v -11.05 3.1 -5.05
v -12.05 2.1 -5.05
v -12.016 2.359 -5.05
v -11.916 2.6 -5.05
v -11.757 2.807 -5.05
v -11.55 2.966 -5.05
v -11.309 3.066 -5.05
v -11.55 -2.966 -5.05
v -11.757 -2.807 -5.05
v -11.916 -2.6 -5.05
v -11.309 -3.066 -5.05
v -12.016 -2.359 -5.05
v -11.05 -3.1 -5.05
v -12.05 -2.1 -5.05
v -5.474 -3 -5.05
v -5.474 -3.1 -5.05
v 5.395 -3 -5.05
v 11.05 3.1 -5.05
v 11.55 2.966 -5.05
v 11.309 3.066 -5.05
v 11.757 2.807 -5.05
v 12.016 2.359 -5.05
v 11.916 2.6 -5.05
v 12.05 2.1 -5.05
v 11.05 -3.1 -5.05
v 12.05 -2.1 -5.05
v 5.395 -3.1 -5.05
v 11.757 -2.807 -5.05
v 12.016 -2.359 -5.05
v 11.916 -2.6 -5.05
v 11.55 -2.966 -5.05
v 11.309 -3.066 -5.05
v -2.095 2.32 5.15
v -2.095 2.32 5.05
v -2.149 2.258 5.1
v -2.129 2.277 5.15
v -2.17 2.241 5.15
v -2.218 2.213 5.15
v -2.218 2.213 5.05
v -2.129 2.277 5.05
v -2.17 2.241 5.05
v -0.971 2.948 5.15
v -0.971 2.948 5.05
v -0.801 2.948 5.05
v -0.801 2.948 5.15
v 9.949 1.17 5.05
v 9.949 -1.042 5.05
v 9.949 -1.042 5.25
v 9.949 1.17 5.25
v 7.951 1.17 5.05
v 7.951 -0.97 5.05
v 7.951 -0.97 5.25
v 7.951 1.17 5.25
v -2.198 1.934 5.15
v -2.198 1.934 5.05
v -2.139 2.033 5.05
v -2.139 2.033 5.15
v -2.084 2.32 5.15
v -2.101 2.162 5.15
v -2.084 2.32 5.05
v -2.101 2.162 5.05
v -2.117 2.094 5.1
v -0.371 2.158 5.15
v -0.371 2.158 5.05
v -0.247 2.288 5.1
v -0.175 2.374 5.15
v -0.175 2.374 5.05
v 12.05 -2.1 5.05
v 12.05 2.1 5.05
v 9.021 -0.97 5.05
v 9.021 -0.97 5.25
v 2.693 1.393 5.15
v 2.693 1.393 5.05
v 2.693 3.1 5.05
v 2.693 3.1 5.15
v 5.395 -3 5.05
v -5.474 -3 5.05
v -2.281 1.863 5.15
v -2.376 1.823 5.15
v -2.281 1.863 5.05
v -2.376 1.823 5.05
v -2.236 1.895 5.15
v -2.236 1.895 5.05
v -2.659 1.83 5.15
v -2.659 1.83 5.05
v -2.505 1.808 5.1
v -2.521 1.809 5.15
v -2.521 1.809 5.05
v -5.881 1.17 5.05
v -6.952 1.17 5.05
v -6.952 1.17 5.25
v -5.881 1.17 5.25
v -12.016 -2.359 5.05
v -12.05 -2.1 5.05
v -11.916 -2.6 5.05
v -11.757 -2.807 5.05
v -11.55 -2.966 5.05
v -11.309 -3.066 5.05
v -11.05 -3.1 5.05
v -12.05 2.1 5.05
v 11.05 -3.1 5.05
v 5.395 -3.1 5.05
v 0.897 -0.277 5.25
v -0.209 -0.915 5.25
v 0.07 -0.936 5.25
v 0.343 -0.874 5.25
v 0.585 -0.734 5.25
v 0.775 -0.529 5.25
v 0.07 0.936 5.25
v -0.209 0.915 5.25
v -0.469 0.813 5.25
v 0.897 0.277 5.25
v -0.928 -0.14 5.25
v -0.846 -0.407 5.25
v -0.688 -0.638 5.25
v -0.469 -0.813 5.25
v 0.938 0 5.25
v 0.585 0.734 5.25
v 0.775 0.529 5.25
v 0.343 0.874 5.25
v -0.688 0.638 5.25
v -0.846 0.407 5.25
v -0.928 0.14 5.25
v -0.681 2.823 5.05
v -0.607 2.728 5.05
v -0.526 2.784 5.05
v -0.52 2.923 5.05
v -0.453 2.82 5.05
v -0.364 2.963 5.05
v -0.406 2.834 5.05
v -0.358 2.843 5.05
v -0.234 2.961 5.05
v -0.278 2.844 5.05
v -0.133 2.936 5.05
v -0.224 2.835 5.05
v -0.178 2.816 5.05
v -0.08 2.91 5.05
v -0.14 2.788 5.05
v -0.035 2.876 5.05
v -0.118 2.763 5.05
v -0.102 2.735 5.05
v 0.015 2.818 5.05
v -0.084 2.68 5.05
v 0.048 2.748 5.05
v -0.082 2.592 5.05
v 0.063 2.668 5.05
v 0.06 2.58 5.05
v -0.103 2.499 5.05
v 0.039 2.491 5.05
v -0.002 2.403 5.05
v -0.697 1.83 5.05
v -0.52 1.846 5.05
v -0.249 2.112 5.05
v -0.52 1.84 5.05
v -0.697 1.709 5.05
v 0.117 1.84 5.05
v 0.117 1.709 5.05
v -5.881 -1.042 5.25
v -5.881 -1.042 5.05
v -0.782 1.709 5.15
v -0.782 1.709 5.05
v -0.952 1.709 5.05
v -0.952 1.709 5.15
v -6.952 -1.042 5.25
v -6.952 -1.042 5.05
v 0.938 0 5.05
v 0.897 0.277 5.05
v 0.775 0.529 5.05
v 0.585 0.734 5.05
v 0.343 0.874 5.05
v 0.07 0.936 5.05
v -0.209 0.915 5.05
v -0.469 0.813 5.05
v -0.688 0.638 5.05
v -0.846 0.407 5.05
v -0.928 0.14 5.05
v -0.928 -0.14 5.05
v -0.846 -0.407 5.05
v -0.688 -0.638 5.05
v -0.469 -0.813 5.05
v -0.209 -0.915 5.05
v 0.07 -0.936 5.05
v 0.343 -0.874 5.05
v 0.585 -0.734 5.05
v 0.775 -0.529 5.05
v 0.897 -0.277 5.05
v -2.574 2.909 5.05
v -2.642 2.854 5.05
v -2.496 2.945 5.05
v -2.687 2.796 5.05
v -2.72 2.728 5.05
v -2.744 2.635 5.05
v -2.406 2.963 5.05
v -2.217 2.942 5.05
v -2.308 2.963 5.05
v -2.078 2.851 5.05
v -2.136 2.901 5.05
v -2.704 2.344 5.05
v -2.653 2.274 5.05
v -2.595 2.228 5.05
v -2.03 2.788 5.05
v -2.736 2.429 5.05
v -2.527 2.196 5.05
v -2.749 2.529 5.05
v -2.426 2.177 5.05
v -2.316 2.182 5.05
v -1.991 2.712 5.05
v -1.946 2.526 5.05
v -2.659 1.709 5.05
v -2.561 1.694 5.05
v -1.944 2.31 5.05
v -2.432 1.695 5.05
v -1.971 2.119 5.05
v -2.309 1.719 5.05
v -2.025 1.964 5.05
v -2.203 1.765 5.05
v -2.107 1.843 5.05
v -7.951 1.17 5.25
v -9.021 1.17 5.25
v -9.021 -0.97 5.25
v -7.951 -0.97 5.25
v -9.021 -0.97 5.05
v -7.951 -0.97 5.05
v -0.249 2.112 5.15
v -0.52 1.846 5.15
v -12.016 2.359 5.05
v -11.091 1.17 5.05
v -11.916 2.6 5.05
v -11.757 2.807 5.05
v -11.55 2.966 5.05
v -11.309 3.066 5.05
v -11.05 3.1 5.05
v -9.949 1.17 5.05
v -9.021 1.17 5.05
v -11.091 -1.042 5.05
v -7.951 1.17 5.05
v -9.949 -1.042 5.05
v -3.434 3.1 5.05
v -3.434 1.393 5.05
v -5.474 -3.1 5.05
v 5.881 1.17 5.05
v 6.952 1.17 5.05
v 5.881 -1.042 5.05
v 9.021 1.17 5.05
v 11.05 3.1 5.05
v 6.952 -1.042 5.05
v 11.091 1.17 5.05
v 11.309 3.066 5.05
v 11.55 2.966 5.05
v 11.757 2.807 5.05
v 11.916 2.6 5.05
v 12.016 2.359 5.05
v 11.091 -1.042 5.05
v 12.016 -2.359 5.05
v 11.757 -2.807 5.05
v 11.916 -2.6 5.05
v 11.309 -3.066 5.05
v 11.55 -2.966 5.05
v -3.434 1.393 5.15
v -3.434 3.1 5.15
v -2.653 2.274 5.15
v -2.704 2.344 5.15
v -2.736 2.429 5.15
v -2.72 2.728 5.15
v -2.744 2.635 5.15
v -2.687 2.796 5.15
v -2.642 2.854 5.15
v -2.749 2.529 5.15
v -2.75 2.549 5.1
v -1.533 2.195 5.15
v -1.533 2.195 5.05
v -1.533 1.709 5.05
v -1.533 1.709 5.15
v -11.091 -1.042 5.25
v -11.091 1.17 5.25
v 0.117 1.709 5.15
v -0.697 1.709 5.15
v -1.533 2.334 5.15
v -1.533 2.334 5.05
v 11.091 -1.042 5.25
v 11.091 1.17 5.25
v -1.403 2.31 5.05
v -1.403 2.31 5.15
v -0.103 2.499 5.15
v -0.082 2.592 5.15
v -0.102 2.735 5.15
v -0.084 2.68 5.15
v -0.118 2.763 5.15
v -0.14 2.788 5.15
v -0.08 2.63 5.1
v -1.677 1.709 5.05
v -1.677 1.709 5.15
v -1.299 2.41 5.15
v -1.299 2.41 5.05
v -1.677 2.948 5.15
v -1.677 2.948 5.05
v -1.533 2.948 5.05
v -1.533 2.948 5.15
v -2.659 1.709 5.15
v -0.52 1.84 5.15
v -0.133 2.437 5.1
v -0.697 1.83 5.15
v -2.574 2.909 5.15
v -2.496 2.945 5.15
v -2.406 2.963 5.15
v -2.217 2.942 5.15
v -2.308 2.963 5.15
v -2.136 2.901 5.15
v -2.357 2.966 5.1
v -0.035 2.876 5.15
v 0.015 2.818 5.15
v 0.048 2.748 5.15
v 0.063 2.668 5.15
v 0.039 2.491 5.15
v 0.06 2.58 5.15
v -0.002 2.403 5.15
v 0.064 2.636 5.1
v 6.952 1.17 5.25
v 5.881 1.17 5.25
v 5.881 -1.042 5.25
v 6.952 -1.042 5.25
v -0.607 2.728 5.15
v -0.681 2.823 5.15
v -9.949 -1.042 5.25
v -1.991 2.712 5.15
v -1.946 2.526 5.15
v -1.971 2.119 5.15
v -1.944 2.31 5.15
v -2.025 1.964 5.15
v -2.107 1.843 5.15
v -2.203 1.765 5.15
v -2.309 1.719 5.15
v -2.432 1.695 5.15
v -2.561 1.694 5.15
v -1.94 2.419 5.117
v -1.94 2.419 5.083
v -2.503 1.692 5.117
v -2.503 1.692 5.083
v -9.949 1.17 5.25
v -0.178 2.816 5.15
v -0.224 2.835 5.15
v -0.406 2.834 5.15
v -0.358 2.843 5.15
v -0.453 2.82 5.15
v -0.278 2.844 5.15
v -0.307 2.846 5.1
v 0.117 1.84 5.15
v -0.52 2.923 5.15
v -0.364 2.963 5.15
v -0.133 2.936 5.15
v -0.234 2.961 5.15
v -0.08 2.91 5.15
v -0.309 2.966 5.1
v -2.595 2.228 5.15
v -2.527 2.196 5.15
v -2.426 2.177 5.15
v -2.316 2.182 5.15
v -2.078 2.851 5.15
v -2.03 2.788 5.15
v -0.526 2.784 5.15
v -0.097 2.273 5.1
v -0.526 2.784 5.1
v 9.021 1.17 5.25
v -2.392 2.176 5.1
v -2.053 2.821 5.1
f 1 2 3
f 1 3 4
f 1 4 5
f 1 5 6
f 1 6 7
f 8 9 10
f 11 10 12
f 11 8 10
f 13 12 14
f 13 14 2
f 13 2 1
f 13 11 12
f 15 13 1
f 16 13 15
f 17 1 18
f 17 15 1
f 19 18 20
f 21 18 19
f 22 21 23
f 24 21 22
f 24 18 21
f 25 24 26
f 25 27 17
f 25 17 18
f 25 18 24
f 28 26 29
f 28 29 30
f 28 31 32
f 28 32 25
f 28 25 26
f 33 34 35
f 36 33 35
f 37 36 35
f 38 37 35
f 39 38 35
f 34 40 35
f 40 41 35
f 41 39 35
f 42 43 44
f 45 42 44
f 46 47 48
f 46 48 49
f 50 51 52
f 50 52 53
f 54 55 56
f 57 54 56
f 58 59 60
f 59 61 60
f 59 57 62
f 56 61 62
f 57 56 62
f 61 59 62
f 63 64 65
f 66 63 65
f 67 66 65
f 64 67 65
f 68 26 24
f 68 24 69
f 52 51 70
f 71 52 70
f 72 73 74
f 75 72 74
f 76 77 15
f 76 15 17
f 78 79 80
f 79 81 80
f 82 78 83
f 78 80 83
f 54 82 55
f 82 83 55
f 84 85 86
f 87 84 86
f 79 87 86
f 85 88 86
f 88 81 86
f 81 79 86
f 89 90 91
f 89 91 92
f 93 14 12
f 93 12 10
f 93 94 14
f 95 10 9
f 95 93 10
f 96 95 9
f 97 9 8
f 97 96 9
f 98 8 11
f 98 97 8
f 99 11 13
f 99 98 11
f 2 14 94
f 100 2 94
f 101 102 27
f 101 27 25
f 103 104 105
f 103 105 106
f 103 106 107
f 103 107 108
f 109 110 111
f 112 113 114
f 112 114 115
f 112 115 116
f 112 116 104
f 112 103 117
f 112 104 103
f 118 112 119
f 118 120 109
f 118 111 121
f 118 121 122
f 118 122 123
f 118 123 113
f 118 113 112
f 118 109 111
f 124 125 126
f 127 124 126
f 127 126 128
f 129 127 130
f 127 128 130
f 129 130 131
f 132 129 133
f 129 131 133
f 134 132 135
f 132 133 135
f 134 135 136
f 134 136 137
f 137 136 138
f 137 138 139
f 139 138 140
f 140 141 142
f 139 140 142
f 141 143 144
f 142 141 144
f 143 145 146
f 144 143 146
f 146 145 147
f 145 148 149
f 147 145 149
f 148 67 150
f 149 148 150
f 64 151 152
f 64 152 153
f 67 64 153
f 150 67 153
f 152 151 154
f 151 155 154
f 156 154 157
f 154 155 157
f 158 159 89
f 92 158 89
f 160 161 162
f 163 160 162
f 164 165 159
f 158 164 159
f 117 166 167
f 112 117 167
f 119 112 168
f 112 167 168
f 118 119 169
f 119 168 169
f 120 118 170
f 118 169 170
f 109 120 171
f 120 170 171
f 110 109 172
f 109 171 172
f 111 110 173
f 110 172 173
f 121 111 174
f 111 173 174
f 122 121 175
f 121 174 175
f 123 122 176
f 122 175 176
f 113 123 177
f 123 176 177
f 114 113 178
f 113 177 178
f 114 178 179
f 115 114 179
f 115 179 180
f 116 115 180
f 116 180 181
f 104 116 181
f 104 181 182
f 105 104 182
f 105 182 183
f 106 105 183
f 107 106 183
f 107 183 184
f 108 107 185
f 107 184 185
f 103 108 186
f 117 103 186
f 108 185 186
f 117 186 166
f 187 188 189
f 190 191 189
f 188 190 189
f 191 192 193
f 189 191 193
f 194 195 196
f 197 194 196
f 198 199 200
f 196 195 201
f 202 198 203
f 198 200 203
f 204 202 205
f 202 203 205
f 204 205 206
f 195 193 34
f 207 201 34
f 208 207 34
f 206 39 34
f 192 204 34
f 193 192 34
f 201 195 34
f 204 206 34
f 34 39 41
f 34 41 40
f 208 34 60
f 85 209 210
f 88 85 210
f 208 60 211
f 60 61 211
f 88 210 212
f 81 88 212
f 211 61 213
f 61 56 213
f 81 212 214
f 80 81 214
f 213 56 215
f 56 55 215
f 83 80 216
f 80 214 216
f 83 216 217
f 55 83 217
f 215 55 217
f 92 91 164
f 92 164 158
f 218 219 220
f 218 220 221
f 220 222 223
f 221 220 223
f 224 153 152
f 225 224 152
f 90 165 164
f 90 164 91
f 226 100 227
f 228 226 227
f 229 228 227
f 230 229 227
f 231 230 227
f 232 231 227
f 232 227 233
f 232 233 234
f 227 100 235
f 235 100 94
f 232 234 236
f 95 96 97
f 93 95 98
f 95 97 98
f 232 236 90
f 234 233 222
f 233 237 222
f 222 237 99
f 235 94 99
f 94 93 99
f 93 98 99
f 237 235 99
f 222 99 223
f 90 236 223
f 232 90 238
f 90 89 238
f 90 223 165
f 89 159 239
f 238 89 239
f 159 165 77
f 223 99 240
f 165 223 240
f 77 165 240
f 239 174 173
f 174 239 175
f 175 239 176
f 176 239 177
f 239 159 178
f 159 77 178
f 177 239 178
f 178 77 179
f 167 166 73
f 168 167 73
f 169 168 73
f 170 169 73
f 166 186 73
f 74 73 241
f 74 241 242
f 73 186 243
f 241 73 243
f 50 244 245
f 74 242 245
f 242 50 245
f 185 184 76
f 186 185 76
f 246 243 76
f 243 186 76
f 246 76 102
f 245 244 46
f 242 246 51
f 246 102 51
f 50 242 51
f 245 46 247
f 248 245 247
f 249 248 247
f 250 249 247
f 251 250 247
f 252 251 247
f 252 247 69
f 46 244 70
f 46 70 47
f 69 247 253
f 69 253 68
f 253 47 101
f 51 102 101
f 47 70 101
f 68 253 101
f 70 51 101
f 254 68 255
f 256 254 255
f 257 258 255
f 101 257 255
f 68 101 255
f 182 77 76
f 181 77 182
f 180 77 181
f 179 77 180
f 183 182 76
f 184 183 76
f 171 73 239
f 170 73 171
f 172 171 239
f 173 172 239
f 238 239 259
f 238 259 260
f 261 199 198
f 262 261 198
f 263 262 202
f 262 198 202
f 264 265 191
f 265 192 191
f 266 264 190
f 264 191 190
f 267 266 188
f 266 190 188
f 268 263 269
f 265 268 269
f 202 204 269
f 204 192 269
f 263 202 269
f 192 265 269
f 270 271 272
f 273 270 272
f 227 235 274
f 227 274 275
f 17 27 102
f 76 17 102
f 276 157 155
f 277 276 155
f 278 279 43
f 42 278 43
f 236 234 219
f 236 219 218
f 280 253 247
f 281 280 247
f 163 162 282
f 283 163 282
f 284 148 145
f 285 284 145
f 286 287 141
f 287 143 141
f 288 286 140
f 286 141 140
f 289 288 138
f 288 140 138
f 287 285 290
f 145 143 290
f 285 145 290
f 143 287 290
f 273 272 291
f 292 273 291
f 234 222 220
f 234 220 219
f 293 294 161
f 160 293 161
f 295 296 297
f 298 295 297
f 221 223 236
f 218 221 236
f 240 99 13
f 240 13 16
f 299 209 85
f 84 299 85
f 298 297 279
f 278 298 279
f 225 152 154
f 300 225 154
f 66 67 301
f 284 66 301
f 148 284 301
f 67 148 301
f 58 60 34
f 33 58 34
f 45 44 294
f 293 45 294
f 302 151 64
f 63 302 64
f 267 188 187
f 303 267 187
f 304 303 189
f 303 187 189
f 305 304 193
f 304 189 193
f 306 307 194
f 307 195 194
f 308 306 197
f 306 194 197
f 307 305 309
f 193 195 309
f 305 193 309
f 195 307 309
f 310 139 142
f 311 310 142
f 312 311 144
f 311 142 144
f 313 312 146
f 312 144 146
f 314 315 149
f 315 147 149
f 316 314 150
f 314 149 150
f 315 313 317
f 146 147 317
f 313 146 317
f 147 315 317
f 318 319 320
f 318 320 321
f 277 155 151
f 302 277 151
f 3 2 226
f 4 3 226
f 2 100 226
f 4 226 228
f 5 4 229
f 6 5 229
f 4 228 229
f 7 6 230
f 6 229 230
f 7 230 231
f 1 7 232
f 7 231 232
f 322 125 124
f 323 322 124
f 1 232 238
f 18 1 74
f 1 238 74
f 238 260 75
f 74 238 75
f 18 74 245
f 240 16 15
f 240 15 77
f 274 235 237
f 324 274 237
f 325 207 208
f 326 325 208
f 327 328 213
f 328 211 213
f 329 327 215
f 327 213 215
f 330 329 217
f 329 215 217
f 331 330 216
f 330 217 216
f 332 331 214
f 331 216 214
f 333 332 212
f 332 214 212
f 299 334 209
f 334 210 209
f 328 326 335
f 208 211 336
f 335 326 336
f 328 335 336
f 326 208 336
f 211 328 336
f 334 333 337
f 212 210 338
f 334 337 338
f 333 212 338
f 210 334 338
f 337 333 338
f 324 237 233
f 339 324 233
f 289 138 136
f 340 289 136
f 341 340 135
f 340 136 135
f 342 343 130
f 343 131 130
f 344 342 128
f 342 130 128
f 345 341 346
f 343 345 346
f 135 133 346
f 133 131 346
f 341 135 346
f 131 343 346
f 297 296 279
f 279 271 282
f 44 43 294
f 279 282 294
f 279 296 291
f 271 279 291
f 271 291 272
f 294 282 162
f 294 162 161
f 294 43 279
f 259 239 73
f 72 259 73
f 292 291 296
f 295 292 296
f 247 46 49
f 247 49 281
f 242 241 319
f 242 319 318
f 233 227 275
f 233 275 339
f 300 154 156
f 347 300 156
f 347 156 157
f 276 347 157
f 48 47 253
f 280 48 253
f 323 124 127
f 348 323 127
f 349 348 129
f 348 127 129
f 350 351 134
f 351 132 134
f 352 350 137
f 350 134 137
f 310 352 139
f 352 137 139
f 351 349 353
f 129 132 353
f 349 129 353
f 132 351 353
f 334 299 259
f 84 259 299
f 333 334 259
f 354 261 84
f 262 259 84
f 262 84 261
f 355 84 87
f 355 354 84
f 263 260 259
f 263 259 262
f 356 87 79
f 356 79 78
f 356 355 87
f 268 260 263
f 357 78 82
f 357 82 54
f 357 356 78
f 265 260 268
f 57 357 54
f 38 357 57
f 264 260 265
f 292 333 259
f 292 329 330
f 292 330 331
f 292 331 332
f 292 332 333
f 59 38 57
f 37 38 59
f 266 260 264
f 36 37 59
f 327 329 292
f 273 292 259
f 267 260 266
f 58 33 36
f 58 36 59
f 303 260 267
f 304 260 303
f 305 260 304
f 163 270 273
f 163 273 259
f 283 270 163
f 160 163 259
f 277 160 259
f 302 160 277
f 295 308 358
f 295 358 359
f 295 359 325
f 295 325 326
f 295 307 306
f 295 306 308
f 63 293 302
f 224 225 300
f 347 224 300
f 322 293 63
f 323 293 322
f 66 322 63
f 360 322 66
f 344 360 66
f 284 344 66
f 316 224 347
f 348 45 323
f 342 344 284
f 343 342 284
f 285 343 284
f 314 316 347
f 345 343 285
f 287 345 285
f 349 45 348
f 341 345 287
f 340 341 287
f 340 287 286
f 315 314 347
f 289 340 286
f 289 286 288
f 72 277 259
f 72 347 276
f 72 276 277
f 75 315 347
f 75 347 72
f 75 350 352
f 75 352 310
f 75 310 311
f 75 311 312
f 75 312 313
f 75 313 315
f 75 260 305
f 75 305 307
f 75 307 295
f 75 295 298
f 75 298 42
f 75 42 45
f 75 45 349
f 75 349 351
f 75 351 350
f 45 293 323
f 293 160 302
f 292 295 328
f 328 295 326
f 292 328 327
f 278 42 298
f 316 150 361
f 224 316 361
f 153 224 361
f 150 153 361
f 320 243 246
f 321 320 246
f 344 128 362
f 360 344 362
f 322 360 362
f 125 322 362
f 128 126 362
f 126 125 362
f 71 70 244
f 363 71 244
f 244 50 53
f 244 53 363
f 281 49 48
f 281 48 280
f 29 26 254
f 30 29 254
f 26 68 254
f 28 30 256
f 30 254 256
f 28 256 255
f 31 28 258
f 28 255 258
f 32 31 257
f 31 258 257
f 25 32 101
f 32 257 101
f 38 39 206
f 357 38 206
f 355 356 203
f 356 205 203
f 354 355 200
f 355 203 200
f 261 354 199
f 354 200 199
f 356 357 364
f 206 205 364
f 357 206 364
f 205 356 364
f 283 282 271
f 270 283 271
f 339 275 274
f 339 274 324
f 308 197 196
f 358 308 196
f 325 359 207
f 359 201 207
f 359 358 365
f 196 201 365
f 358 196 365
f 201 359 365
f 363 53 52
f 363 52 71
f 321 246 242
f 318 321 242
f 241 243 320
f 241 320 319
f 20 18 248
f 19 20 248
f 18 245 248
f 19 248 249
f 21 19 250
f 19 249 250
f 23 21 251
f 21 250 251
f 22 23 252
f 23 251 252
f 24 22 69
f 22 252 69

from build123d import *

# Parameters (mm, degrees)
F0_W      = 24.1
F0_H      = 10.1
F1_DEPTH  = 3.1
F2_W      = 1.1417344213
F2_H      = 2.2121103248
F2_W_2    = 1.0703755543
F2_H_2    = 2.1407519816
F2_W_3    = 1.0703760199
F2_R      = 0.9384971682
F3_DEPTH  = 0.2
F4_R      = 1
F5_R      = 1
F6_R      = 1
F7_R      = 1
F8_W      = 10.8690736815
F8_H      = 10.1
F9_DEPTH  = 0.1
F10_W     = 6.1270436272
F10_H     = 1.7071549356
F11_DEPTH = 0.1


with BuildPart() as f1:
    # F0 (on Front) → F1 (new body, symmetric)
    with BuildSketch(Plane.XZ):
        Rectangle(F0_W, F0_H)
    extrude(amount=F1_DEPTH, both=True)

    # F2 (on face) → F3 (join)
    with BuildSketch(Plane.XY.offset(5.05)):
        with Locations((-10.5197010562, 0.0642262748)):
            Rectangle(F2_W, F2_H)
        with Locations((-8.4859863855, 0.0999054464)):
            Rectangle(F2_W_2, F2_H_2)
        with Locations((-6.4165925141, 0.0642262748)):
            Rectangle(F2_W_3, F2_H)
        with Locations((6.4165925141, 0.0642262748)):
            Rectangle(F2_W_3, F2_H)
        with Locations((8.4859863855, 0.0999054464)):
            Rectangle(F2_W_2, F2_H_2)
        with Locations((10.5197010562, 0.0642262748)):
            Rectangle(F2_W, F2_H)
        Circle(F2_R)
    extrude(amount=F3_DEPTH)

    # F4
    f4_edges = [f1.edges().sort_by_distance(p)[0] for p in [
        (-12.05, 3.1, 0),
    ]]
    fillet(f4_edges, radius=F4_R)

    # F5
    f5_edges = [f1.edges().sort_by_distance(p)[0] for p in [
        (-12.05, -3.1, 0),
    ]]
    fillet(f5_edges, radius=F5_R)

    # F6
    f6_edges = [f1.edges().sort_by_distance(p)[0] for p in [
        (12.05, 3.1, 0),
    ]]
    fillet(f6_edges, radius=F6_R)

    # F7
    f7_edges = [f1.edges().sort_by_distance(p)[0] for p in [
        (12.05, -3.1, 0),
    ]]
    fillet(f7_edges, radius=F7_R)

    # F8 (on face) → F9 (cut)
    with BuildSketch(Plane.XZ.offset(3.1)):
        with Locations((-0.0399495475, 0)):
            Rectangle(F8_W, F8_H)
    extrude(amount=-F9_DEPTH, mode=Mode.SUBTRACT)

    # F10 (on face) → F11 (join)
    with BuildSketch(Plane.XY.offset(5.05)):
        with Locations((-0.3709765151, 2.2464225322)):
            Rectangle(F10_W, F10_H)
        with BuildLine():
            add(Edge.make_bspline(
                [(-1.9910920446, 2.7120085217), (-1.9402540003, 2.5879636937), (-1.9402540003, 2.4193169547)],
                knots=[0, 0, 0, 1, 1, 1], degree=2))
            add(Edge.make_bspline(
                [(-1.9402540003, 2.4193169547), (-1.9402540003, 1.6921295692), (-2.5028616905, 1.6921295692)],
                knots=[0, 0, 0, 1, 1, 1], degree=2))
            add(Edge.make_bspline(
                [(-2.5028616905, 1.6921295692), (-2.6012841443, 1.6921295692), (-2.6587650264, 1.709211152)],
                knots=[0, 0, 0, 1, 1, 1], degree=2))
            Line((-2.6587650264, 1.709211152), (-2.6587650264, 1.8304090496))
            add(Edge.make_bspline(
                [(-2.6587650264, 1.8304090496), (-2.5909809673, 1.8084470145), (-2.5047596442, 1.8084470145)],
                knots=[0, 0, 0, 1, 1, 1], degree=2))
            add(Edge.make_bspline(
                [(-2.5047596442, 1.8084470145), (-2.301407467, 1.8084470145), (-2.1975622885, 1.9342542281)],
                knots=[0, 0, 0, 1, 1, 1], degree=2))
            add(Edge.make_bspline(
                [(-2.1975622885, 1.9342542281), (-2.0937171101, 2.0600614417), (-2.084498478, 2.3200810923)],
                knots=[0, 0, 0, 1, 1, 1], degree=2))
            Line((-2.084498478, 2.3200810923), (-2.0945305188, 2.3200810923))
            add(Edge.make_bspline(
                [(-2.0945305188, 2.3200810923), (-2.1411659514, 2.2498568071), (-2.2183042106, 2.212982279)],
                knots=[0, 0, 0, 1, 1, 1], degree=2))
            add(Edge.make_bspline(
                [(-2.2183042106, 2.212982279), (-2.2954424698, 2.1761077508), (-2.3919669699, 2.1761077508)],
                knots=[0, 0, 0, 1, 1, 1], degree=2))
            add(Edge.make_bspline(
                [(-2.3919669699, 2.1761077508), (-2.5562755291, 2.1761077508), (-2.6529355973, 2.2743946365)],
                knots=[0, 0, 0, 1, 1, 1], degree=2))
            add(Edge.make_bspline(
                [(-2.6529355973, 2.2743946365), (-2.7495956655, 2.3726815221), (-2.7495956655, 2.5489200756)],
                knots=[0, 0, 0, 1, 1, 1], degree=2))
            add(Edge.make_bspline(
                [(-2.7495956655, 2.5489200756), (-2.7495956655, 2.7419690758), (-2.6415478754, 2.8538127733)],
                knots=[0, 0, 0, 1, 1, 1], degree=2))
            add(Edge.make_bspline(
                [(-2.6415478754, 2.8538127733), (-2.5335000852, 2.9656564707), (-2.3572615317, 2.9656564707)],
                knots=[0, 0, 0, 1, 1, 1], degree=2))
            add(Edge.make_bspline(
                [(-2.3572615317, 2.9656564707), (-2.2309120456, 2.9656564707), (-2.1364210673, 2.9008549103)],
                knots=[0, 0, 0, 1, 1, 1], degree=2))
            add(Edge.make_bspline(
                [(-2.1364210673, 2.9008549103), (-2.0419300889, 2.8360533498), (-1.9910920446, 2.7120085217)],
                knots=[0, 0, 0, 1, 1, 1], degree=2))
        make_face(mode=Mode.SUBTRACT)
        Polygon((-1.2990168017, 2.4098271865), (-0.7822311354, 1.709211152), (-0.9516912831, 1.709211152), (-1.4031331164, 2.3100490515), (-1.5330073735, 2.1948161511), (-1.5330073735, 1.709211152), (-1.676980715, 1.709211152), (-1.676980715, 2.9480326154), (-1.5330073735, 2.9480326154), (-1.5330073735, 2.3336379041), (-0.9712130921, 2.9480326154), (-0.8009395357, 2.9480326154), align=None, mode=Mode.SUBTRACT)
        with BuildLine():
            Line((0.1168566239, 1.8396276817), (0.1168566239, 1.709211152))
            Line((0.1168566239, 1.709211152), (-0.6973654935, 1.709211152))
            Line((-0.6973654935, 1.709211152), (-0.6973654935, 1.8304090496))
            Line((-0.6973654935, 1.8304090496), (-0.3711886013, 2.1582127592))
            add(Edge.make_bspline(
                [(-0.3711886013, 2.1582127592), (-0.2220636714, 2.3092356428), (-0.17461483, 2.3736304989)],
                knots=[0, 0, 0, 1, 1, 1], degree=2))
            add(Edge.make_bspline(
                [(-0.17461483, 2.3736304989), (-0.1271659887, 2.438025355), (-0.103441568, 2.4990310082)],
                knots=[0, 0, 0, 1, 1, 1], degree=2))
            add(Edge.make_bspline(
                [(-0.103441568, 2.4990310082), (-0.0797171473, 2.5600366613), (-0.0797171473, 2.6302609465)],
                knots=[0, 0, 0, 1, 1, 1], degree=2))
            add(Edge.make_bspline(
                [(-0.0797171473, 2.6302609465), (-0.0797171473, 2.729496809), (-0.1399093918, 2.7875199635)],
                knots=[0, 0, 0, 1, 1, 1], degree=2))
            add(Edge.make_bspline(
                [(-0.1399093918, 2.7875199635), (-0.2001016362, 2.8455431181), (-0.3069293133, 2.8455431181)],
                knots=[0, 0, 0, 1, 1, 1], degree=2))
            add(Edge.make_bspline(
                [(-0.3069293133, 2.8455431181), (-0.3839320044, 2.8455431181), (-0.4530717446, 2.8200563119)],
                knots=[0, 0, 0, 1, 1, 1], degree=2))
            add(Edge.make_bspline(
                [(-0.4530717446, 2.8200563119), (-0.5222114849, 2.7945695057), (-0.6068059906, 2.7275988553)],
                knots=[0, 0, 0, 1, 1, 1], degree=2))
            Line((-0.6068059906, 2.7275988553), (-0.6813684555, 2.8233099467))
            add(Edge.make_bspline(
                [(-0.6813684555, 2.8233099467), (-0.5102814905, 2.9656564707), (-0.3085561307, 2.9656564707)],
                knots=[0, 0, 0, 1, 1, 1], degree=2))
            add(Edge.make_bspline(
                [(-0.3085561307, 2.9656564707), (-0.1339443946, 2.9656564707), (-0.0348441003, 2.8763170809)],
                knots=[0, 0, 0, 1, 1, 1], degree=2))
            add(Edge.make_bspline(
                [(-0.0348441003, 2.8763170809), (0.0642561941, 2.7869776911), (0.0642561941, 2.6362259437)],
                knots=[0, 0, 0, 1, 1, 1], degree=2))
            add(Edge.make_bspline(
                [(0.0642561941, 2.6362259437), (0.0642561941, 2.518281681), (-0.0019010476, 2.4030487806)],
                knots=[0, 0, 0, 1, 1, 1], degree=2))
            add(Edge.make_bspline(
                [(-0.0019010476, 2.4030487806), (-0.0680582892, 2.2878158802), (-0.249177295, 2.1115773266)],
                knots=[0, 0, 0, 1, 1, 1], degree=2))
            Line((-0.249177295, 2.1115773266), (-0.5203135312, 1.8464060876))
            Line((-0.5203135312, 1.8464060876), (-0.5203135312, 1.8396276817))
            Line((-0.5203135312, 1.8396276817), (0.1168566239, 1.8396276817))
        make_face(mode=Mode.SUBTRACT)
    extrude(amount=F11_DEPTH)


solid = f1.part
